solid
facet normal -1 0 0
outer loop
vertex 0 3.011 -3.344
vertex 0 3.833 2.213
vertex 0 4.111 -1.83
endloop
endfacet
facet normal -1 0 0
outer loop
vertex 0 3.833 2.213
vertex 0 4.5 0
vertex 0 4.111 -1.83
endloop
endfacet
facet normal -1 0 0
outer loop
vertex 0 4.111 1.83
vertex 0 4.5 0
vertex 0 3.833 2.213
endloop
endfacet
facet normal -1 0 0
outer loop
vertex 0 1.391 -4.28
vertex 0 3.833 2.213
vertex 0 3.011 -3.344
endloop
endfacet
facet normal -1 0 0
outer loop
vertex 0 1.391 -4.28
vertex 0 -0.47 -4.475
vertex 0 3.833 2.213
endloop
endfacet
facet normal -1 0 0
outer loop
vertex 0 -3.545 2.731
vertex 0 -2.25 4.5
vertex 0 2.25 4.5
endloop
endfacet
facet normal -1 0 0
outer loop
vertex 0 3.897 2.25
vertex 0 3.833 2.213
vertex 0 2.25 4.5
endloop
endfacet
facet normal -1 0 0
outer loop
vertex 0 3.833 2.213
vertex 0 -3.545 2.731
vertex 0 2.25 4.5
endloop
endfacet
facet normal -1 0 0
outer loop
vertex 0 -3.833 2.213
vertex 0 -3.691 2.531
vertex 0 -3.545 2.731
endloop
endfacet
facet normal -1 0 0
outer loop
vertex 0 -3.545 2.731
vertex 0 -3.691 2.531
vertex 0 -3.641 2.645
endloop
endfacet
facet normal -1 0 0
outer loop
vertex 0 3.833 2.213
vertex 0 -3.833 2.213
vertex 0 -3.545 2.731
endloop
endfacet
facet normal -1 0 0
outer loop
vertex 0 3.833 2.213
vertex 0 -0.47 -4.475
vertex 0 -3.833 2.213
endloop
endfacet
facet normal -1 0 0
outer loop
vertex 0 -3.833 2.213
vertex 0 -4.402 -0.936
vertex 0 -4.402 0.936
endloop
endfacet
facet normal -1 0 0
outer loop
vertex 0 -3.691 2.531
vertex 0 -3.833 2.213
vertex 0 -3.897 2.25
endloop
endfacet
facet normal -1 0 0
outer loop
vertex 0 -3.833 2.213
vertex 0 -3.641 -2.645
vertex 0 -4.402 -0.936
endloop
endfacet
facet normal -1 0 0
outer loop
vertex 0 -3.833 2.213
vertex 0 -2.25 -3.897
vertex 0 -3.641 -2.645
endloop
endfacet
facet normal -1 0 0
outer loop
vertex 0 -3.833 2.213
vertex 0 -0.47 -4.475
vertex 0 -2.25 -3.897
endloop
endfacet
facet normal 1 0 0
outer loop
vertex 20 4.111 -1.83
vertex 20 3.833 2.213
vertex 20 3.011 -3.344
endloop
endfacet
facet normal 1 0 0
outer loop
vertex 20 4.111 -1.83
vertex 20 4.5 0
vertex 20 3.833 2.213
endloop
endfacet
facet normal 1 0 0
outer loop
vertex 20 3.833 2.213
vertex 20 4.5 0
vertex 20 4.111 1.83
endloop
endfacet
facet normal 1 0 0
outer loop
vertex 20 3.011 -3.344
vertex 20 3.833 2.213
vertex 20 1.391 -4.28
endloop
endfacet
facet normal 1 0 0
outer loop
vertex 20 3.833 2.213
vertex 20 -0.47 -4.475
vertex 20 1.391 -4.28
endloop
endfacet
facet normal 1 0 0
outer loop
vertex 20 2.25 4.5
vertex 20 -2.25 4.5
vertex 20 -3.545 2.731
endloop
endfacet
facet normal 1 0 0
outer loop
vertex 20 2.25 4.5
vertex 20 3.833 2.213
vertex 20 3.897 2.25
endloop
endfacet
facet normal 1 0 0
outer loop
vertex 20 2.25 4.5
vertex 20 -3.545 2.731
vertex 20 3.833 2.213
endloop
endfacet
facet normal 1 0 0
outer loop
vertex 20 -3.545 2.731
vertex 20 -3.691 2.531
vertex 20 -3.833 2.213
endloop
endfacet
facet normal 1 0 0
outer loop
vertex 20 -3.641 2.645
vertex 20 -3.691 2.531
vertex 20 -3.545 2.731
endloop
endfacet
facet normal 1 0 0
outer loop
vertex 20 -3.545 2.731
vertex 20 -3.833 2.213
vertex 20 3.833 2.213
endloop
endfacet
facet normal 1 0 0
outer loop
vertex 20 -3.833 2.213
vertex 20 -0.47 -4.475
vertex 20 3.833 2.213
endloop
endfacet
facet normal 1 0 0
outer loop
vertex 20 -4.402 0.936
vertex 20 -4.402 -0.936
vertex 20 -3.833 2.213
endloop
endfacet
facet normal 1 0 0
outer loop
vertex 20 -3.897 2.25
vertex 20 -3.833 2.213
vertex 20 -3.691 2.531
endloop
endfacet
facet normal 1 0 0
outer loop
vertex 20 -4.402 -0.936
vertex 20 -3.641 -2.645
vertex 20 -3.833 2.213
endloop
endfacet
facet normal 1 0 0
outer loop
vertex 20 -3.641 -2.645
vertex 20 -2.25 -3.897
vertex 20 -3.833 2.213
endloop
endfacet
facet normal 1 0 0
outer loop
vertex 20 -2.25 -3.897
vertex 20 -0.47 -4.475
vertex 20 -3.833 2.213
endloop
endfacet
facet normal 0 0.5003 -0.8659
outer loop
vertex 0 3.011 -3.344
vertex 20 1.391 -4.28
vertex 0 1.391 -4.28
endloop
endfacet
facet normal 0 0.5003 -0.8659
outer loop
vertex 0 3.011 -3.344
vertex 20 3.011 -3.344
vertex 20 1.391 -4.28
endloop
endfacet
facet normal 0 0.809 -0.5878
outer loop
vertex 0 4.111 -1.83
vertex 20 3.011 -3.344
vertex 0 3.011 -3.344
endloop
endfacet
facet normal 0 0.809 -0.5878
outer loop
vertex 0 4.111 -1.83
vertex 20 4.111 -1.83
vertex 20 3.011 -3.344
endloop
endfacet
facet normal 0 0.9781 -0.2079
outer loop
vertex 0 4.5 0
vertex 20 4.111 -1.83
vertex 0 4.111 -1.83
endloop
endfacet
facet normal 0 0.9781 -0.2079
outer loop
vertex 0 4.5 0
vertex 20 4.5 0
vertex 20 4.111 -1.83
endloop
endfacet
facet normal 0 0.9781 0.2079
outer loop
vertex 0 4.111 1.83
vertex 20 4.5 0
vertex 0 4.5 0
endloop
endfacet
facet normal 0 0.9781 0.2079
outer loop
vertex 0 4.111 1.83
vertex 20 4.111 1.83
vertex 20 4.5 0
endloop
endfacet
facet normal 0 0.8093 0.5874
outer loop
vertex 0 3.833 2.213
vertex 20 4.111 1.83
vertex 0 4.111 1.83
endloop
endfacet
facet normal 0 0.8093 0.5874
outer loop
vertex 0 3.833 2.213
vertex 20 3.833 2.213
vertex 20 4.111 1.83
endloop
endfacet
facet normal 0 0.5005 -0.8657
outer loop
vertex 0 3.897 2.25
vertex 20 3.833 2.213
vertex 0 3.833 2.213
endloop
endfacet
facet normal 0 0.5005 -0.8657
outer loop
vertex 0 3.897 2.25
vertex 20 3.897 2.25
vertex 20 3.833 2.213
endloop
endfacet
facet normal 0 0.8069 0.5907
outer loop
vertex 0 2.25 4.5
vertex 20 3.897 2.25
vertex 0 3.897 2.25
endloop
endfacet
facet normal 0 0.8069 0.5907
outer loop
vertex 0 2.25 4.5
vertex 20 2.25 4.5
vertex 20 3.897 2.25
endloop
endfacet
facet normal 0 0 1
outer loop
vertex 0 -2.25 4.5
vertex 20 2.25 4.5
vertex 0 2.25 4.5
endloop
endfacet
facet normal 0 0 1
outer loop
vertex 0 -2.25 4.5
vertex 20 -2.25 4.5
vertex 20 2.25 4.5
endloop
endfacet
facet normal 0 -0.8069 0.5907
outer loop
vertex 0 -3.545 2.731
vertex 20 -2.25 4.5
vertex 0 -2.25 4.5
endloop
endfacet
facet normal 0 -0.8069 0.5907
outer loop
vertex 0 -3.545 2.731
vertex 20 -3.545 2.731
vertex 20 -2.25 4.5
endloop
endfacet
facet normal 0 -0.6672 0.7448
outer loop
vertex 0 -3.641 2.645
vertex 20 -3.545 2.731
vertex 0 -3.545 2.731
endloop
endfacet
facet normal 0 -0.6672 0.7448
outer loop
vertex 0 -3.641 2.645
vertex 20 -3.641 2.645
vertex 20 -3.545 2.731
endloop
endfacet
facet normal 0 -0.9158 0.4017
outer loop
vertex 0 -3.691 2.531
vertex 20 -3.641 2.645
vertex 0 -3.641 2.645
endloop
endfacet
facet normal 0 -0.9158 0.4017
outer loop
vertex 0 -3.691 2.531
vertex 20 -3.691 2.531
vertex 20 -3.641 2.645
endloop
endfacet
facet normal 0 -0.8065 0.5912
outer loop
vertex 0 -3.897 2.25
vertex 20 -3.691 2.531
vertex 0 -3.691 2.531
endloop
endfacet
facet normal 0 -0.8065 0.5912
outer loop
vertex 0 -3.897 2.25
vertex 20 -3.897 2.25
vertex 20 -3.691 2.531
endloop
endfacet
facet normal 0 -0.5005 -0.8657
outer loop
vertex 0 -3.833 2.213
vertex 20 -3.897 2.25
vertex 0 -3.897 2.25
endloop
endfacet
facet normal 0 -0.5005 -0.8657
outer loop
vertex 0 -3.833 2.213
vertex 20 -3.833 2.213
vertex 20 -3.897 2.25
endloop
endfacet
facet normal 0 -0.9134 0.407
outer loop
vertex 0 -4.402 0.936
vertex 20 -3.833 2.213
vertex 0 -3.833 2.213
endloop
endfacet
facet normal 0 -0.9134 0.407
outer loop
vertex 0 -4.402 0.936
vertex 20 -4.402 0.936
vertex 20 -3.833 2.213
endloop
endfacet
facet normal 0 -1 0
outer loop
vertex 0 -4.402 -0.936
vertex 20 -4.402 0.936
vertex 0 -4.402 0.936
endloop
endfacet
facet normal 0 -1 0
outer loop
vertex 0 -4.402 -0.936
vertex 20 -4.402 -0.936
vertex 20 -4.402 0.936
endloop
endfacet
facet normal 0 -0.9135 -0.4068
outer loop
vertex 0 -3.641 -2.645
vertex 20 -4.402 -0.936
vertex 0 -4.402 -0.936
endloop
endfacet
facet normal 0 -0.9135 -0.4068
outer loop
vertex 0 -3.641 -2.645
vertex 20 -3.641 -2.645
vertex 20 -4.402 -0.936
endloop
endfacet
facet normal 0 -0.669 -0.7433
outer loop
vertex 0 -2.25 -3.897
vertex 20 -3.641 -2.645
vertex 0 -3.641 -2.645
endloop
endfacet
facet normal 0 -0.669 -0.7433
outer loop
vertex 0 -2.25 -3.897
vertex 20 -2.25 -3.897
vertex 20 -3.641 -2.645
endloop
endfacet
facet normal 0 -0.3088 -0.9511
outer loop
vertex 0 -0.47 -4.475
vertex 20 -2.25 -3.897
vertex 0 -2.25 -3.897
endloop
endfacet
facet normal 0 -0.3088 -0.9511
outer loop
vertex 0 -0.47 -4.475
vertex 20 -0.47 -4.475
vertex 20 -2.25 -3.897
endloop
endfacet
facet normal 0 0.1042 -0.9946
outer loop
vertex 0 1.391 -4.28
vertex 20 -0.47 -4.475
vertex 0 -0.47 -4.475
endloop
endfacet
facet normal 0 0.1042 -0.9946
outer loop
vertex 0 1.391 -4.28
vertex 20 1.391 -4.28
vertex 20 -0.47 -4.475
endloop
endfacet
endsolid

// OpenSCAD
teardrop();

module teardrop (r=4.5,h=20,top_and_bottom=false)
{
	rotate([-270,0,90])
	linear_extrude(height=h,convexity=10)
	{
		circle(r=r);
		polygon(points=[[0,0],[r*cos(30),r*sin(30)],[0.5*r,r],[-0.5*r,r],[-r*cos(30),r*sin(30)]],
				paths=[[0,1,2,3,4]]);
		if (top_and_bottom)
		polygon(points=[[0,0],[r*cos(30),-r*sin(30)],[0.5*r,-r],[-0.5*r,-r],[-r*cos(30),-r*sin(30)]],
				paths=[[0,1,2,3,4]]);
		
	}
}

module teardropcentering (r=4.5,h=20)
{
	rotate([-270,0,90])
	linear_extrude(height=h)
	{
		circle(r=r, $fn = 24);
		polygon(points=[[0,0],[r*cos(30),r*sin(30)],[0.5*r,1.2*r],[-0.5*r,1.2*r],[-r*cos(30),r*sin(30)]],
				paths=[[0,1,2,3,4]]);
	}
}

module teardropcentering2 (r=4.5,h=20)
{
	//rotate([-270,0,90])
	difference(){
	linear_extrude(height=h)
	{
		circle(r=r, $fn = 24);
		polygon(points=[[0,0],[r*cos(30),r*sin(30)],[0.5*r,1.2*r],[-0.5*r,1.2*r],[-r*cos(30),r*sin(30)]],
				paths=[[0,1,2,3,4]]);
	}
	translate(v = [-1.5*r, -1.5*r,-1])cube(size =[3*r,1.5*r,h+2]);
	}
}
